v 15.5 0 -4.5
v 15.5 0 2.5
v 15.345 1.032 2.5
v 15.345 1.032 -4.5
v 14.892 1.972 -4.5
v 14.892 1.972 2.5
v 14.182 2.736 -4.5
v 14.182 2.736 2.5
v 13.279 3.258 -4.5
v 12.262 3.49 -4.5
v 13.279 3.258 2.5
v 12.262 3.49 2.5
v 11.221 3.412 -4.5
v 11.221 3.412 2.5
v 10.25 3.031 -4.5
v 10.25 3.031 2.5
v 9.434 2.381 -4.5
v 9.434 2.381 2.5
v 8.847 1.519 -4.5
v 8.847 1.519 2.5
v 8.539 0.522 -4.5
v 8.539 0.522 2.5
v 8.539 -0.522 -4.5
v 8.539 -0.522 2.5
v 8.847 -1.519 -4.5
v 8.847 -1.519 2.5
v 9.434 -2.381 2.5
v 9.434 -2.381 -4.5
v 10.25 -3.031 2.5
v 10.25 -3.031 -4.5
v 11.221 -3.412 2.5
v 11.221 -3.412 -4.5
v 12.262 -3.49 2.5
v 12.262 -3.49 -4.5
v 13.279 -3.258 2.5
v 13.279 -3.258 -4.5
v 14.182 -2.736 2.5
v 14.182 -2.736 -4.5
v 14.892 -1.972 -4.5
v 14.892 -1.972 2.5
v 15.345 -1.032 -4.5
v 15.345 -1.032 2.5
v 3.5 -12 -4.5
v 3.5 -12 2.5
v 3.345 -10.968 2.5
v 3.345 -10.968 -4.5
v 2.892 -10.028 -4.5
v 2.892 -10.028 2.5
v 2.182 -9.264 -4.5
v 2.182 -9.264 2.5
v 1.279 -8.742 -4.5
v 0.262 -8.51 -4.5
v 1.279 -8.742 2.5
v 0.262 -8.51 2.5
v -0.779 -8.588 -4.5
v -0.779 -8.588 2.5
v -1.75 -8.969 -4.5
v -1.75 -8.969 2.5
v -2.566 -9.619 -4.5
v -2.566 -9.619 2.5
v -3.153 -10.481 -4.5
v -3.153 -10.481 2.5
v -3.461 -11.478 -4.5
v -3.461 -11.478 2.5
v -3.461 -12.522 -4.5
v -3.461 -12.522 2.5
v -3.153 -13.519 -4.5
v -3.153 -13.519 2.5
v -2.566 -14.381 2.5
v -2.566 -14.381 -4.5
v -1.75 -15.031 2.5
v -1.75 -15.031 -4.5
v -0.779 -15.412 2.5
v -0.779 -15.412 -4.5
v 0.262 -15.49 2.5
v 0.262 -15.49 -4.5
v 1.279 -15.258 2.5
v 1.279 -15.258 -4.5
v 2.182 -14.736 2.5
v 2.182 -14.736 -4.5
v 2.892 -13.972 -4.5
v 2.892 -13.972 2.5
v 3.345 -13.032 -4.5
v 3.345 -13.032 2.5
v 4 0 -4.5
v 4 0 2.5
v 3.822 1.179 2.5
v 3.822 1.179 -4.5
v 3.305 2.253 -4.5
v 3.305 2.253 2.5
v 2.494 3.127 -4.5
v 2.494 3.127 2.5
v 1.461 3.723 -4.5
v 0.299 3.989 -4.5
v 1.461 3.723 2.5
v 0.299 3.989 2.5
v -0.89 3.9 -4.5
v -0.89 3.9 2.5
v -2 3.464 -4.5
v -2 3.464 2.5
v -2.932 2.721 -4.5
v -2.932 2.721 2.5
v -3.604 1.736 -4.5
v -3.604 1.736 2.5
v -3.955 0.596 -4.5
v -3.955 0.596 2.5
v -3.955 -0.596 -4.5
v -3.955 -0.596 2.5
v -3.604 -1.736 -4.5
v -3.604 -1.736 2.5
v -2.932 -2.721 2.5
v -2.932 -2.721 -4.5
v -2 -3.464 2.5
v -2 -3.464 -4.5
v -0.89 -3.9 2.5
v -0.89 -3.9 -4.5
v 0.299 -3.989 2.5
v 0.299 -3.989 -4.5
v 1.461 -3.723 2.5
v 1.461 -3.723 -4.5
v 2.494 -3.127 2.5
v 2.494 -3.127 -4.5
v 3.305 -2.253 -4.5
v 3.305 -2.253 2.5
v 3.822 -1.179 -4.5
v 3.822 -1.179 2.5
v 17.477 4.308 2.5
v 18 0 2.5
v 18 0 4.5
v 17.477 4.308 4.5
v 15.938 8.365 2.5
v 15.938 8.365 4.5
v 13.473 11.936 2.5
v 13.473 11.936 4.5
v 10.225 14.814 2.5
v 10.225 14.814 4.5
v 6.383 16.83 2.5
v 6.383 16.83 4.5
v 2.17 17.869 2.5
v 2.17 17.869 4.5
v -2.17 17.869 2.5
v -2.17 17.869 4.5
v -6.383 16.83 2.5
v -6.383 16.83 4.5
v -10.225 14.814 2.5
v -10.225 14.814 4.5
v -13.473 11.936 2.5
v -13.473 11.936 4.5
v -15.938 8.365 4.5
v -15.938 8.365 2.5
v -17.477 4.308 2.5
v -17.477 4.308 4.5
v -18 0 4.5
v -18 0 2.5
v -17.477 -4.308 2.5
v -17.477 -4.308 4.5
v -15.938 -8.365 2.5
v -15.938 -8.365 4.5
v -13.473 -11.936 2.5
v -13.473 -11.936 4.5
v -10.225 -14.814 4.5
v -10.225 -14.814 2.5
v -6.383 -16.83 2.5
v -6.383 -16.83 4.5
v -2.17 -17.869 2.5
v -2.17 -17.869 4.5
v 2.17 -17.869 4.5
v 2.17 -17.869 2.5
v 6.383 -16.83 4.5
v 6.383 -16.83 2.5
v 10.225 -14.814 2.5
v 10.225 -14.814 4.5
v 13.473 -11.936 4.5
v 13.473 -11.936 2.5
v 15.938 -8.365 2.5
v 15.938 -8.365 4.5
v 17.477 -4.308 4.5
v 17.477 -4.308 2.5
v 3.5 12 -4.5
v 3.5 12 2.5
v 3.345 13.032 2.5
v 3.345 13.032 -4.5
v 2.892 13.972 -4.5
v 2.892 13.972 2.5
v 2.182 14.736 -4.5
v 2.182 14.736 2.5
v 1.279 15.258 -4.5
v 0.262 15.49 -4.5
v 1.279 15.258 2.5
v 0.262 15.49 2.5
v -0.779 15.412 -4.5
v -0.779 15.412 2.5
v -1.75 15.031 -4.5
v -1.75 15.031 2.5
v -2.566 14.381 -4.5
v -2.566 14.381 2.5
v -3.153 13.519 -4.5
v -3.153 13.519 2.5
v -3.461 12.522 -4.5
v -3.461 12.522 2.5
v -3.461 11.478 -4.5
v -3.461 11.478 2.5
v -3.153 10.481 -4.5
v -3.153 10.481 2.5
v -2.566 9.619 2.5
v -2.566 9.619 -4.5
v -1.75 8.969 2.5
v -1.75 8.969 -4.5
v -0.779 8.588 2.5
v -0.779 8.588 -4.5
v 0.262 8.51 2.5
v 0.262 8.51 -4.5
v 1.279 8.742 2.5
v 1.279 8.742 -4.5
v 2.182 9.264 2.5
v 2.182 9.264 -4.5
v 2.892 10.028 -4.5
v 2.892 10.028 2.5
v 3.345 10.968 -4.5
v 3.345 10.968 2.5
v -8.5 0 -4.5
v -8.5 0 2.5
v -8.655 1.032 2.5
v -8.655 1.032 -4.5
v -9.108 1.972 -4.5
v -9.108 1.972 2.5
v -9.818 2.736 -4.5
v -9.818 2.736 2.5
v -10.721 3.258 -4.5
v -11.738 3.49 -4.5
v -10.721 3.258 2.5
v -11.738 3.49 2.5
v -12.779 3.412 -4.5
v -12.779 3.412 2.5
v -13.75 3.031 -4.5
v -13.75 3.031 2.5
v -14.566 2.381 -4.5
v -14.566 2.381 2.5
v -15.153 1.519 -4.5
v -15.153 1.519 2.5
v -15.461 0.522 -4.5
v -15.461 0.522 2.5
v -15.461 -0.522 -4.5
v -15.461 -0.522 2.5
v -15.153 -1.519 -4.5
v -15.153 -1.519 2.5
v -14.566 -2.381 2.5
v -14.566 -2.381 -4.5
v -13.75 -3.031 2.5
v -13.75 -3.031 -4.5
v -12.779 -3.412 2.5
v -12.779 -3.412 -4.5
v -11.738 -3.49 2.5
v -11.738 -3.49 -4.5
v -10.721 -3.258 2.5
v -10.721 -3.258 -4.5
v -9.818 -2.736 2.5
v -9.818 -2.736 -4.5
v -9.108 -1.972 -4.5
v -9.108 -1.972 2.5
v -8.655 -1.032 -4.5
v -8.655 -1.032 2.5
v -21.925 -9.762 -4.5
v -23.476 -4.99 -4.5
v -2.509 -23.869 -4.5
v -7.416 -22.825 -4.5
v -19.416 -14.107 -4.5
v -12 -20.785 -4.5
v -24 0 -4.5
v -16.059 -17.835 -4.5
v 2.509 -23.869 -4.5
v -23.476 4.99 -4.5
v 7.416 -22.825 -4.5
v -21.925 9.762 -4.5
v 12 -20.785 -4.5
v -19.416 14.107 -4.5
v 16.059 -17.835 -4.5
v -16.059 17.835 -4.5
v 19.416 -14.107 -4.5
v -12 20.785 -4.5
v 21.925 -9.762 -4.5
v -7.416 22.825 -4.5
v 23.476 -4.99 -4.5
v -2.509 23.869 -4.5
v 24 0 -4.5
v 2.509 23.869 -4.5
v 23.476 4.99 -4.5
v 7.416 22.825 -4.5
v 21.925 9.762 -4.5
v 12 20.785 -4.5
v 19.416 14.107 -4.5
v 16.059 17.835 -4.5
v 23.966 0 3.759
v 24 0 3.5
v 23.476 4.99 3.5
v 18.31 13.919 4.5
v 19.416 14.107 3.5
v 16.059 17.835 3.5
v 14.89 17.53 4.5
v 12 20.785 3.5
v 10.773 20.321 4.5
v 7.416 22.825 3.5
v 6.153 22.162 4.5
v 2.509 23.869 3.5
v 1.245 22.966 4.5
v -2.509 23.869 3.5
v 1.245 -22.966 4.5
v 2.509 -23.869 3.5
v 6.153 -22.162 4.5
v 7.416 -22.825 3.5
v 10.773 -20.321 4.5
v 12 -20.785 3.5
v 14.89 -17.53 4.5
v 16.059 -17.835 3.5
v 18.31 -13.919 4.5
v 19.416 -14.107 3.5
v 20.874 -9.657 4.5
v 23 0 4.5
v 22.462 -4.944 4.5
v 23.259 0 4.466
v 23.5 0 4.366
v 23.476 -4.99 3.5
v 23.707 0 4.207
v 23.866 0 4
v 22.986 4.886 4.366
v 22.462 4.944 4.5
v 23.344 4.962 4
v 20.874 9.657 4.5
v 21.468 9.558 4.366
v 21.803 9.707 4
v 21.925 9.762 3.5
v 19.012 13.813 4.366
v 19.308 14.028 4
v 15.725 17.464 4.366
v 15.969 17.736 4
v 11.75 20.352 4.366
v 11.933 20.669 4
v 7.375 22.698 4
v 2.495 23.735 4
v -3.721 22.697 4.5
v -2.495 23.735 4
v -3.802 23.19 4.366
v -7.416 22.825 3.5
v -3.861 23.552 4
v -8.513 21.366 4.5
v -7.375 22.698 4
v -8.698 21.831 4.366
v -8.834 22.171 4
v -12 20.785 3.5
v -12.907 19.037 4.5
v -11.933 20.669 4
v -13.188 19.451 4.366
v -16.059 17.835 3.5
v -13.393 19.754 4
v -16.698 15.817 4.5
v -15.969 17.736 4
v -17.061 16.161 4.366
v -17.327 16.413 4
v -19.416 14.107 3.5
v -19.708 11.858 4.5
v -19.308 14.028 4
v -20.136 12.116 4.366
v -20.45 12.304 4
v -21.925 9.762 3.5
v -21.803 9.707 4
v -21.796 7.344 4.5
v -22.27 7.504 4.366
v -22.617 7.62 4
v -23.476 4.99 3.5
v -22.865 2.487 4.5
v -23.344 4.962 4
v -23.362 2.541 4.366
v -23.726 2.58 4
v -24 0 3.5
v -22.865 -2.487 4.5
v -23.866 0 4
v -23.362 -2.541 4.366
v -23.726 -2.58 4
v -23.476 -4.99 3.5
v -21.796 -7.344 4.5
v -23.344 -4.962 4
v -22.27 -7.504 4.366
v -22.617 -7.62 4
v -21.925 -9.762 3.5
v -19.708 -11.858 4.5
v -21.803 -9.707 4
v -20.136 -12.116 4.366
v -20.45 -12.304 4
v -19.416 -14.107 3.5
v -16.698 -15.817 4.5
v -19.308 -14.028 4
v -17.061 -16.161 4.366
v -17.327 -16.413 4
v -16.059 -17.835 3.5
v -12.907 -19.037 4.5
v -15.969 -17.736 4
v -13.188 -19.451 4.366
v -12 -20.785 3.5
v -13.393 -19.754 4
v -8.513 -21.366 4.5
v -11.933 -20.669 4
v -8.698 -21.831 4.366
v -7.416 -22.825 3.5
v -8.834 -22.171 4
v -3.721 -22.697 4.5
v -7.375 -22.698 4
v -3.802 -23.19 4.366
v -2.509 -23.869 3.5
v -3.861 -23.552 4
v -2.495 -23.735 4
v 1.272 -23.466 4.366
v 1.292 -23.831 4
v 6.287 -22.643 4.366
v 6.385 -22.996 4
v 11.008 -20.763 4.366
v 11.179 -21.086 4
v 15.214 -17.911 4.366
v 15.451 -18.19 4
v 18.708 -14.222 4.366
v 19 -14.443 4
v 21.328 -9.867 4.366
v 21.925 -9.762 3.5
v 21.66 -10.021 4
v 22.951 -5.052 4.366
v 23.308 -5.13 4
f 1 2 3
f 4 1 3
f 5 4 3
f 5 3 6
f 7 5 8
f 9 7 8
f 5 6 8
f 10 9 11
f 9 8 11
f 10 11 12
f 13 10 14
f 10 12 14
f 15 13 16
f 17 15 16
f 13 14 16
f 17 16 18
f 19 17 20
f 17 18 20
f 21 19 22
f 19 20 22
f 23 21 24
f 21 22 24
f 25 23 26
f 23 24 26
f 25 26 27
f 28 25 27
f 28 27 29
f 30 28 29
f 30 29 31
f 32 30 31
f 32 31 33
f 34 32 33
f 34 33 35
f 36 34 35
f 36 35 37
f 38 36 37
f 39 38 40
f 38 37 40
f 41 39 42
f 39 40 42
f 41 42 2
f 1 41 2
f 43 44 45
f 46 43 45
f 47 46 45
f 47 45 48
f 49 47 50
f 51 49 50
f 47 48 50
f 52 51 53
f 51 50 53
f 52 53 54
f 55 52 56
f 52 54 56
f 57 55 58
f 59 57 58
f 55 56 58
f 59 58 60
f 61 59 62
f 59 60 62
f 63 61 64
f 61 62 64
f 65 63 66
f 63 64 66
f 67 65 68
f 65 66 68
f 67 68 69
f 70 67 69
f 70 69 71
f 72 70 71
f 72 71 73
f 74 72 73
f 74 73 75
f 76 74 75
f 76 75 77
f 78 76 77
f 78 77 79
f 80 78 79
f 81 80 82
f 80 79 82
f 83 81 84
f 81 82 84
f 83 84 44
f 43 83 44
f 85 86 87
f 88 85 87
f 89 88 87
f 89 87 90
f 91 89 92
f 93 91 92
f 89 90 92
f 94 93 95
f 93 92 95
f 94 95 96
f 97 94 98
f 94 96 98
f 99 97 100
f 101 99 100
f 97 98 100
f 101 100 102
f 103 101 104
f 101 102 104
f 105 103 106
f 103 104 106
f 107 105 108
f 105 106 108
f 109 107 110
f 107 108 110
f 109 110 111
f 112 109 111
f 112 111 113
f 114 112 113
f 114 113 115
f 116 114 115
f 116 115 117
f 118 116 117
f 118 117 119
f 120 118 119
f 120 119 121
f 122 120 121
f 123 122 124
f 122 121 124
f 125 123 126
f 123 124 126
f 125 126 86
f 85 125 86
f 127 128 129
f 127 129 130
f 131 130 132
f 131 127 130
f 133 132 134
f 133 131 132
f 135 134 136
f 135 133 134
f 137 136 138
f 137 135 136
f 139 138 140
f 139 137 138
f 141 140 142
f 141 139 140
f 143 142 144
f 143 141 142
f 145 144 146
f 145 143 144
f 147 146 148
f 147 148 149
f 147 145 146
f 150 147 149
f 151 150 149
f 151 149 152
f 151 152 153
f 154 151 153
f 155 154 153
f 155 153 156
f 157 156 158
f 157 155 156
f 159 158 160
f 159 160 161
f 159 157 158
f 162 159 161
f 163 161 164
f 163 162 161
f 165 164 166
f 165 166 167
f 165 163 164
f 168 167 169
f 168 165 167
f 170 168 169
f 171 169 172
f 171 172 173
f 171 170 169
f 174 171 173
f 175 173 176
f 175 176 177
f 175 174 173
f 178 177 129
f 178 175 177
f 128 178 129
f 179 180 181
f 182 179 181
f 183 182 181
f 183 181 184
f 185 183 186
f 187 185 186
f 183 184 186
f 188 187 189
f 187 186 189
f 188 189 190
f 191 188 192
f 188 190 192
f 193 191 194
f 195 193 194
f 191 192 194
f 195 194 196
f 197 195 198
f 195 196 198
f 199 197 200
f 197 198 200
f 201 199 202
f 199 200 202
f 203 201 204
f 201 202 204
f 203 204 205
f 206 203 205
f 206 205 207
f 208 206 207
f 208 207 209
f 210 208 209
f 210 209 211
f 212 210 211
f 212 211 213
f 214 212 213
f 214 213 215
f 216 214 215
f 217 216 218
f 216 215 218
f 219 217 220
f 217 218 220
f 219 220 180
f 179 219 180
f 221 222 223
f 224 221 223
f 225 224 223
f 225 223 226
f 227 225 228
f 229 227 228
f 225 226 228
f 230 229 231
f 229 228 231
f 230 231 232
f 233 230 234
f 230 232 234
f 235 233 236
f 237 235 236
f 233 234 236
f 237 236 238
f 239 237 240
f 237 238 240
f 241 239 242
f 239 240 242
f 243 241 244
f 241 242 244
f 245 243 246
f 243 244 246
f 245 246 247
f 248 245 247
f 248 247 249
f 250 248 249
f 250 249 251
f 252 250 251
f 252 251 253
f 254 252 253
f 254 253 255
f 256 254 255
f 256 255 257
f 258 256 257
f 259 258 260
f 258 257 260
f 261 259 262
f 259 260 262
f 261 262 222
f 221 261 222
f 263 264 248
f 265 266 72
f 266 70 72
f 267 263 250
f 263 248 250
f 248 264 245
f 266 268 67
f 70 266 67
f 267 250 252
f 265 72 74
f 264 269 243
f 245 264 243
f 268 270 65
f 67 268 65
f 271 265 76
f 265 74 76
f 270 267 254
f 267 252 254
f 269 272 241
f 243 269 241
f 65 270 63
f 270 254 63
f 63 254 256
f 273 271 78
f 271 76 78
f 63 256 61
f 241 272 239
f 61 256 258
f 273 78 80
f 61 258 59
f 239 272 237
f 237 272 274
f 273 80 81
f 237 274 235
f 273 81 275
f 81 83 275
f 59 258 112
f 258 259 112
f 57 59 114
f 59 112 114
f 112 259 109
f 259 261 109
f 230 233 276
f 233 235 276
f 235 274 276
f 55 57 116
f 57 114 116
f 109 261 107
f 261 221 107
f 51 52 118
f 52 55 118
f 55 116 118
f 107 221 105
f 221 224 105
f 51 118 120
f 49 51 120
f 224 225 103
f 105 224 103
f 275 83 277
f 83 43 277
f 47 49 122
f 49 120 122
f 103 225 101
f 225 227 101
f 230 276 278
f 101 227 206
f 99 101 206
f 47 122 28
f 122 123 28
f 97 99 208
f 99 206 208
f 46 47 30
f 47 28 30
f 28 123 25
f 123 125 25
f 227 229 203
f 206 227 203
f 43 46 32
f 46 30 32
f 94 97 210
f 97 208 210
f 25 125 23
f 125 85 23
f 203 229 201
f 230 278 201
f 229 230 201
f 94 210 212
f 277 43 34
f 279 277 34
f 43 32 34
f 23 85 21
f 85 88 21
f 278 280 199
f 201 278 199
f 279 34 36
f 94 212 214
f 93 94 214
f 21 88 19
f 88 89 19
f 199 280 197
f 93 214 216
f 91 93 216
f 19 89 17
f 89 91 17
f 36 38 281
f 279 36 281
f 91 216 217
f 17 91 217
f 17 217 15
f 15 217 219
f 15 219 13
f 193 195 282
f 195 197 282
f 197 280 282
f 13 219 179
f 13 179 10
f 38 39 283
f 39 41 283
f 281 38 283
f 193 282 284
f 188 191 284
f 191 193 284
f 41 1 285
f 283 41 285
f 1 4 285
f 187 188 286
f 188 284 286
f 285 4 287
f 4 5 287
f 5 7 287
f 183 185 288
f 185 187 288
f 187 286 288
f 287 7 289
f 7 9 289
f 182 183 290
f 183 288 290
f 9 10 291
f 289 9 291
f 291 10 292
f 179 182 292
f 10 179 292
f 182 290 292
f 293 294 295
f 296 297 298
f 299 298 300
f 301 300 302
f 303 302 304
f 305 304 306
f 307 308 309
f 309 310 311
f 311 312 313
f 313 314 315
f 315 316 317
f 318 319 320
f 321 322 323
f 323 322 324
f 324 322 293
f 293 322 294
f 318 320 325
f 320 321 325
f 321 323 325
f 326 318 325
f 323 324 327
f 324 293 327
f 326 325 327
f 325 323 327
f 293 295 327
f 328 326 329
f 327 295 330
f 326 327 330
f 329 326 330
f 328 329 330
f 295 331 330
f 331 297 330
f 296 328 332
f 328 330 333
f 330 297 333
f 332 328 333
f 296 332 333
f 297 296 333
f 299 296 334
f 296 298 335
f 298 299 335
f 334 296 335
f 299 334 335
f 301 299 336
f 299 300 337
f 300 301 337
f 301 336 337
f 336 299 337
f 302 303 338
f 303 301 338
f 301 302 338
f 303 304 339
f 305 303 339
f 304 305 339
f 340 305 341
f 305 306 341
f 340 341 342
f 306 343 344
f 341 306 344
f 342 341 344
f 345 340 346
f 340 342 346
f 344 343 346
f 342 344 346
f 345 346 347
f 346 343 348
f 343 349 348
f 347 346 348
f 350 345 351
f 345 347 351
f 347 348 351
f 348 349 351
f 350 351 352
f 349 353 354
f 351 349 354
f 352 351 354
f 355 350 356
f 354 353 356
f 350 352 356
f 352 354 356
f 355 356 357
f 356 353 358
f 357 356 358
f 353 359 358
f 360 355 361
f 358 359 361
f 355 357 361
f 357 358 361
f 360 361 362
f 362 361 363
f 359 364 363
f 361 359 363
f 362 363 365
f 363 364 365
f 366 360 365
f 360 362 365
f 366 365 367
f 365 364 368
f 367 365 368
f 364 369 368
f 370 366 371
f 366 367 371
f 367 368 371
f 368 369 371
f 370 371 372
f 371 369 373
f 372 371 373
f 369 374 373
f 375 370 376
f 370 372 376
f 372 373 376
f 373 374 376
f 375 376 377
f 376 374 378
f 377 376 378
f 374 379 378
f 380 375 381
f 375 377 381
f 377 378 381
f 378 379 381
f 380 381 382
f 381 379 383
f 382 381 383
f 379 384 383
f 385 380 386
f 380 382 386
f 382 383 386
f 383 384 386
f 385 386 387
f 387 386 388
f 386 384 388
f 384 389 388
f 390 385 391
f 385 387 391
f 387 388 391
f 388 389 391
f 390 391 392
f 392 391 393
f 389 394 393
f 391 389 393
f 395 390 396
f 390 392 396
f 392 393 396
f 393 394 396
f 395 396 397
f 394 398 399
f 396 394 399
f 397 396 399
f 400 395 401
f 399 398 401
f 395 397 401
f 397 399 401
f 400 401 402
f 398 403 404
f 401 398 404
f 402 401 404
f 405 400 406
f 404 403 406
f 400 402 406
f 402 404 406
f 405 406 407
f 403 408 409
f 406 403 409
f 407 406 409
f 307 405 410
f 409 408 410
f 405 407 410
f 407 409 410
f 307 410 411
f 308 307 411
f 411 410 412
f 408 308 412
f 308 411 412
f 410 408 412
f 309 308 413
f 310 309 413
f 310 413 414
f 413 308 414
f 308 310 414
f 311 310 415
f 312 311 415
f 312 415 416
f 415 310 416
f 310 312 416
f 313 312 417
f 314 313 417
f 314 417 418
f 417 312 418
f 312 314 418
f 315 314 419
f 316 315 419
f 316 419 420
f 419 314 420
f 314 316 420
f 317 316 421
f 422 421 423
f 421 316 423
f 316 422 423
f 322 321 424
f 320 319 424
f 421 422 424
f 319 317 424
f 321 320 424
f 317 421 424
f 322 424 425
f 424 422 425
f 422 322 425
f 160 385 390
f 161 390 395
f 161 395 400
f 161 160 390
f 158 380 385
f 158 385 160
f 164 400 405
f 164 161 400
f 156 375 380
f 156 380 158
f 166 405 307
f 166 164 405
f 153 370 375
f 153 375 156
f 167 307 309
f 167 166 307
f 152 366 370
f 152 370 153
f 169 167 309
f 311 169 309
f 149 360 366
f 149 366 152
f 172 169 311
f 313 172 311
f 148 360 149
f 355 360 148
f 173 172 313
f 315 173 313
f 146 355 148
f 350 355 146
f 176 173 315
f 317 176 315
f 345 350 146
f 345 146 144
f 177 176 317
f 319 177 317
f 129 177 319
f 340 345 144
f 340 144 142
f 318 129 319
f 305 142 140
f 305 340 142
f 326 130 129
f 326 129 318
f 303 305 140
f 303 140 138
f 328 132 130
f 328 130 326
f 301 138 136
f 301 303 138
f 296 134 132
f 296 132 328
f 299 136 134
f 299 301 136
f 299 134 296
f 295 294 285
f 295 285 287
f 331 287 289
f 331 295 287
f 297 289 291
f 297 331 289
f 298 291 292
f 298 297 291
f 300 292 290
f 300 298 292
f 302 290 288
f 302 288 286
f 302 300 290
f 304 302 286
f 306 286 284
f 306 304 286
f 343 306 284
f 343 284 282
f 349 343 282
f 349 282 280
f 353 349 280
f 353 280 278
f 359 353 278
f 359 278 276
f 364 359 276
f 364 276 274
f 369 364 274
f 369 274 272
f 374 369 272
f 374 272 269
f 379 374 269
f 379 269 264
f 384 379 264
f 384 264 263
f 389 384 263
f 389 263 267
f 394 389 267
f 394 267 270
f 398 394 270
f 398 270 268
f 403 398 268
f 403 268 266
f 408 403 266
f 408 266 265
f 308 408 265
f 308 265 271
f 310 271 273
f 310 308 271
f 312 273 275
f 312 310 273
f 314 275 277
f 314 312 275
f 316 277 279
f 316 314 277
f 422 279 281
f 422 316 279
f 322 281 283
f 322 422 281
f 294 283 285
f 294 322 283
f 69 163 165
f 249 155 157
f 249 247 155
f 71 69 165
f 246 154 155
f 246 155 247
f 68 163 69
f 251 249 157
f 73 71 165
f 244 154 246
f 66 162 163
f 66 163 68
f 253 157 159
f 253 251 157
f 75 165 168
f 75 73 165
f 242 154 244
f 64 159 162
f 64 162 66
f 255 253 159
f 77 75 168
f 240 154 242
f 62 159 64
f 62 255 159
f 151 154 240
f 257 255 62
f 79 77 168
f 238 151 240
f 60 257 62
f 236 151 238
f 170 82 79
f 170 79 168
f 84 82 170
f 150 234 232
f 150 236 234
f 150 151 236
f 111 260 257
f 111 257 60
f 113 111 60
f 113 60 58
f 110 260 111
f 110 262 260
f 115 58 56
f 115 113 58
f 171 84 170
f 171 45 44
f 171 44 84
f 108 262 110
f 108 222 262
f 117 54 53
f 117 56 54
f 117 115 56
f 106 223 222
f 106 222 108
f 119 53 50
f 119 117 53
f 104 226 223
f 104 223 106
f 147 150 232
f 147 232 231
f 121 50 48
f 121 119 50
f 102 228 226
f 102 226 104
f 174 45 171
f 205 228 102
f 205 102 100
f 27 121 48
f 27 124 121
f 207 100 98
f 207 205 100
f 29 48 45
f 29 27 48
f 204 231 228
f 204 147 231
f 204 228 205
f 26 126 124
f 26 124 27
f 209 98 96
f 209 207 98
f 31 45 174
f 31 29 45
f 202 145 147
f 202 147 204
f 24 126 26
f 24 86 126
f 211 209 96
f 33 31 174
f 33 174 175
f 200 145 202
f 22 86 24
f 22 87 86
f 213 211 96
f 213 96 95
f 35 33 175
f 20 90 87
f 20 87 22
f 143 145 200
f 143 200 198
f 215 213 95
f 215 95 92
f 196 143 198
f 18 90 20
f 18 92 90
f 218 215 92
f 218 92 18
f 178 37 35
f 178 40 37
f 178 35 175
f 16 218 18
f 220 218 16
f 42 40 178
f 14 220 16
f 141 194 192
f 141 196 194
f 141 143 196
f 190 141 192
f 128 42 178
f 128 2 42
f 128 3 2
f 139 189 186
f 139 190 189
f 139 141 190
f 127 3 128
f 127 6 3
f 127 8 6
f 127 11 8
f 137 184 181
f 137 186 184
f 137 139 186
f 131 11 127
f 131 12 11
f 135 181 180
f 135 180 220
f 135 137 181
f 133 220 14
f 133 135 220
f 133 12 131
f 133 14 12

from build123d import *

# Parameters (mm, degrees)
SKETCH1_R           = 24
SKETCH1_R_2         = 18
BOSS_EXTRUDE3_DEPTH = 4.5
BOSS_EXTRUDE4_START = -4.5
SKETCH1_7_R         = 18
SKETCH1_7_R_2       = 3.5
SKETCH1_7_R_3       = 4
BOSS_EXTRUDE4_DEPTH = 7
FILLET1_R           = 1


with BuildPart() as part:
    # Sketch1 → Boss-Extrude3 (new, symmetric)
    with BuildSketch(Plane.XY):
        Circle(SKETCH1_R)
        Circle(SKETCH1_R_2, mode=Mode.SUBTRACT)
    extrude(amount=BOSS_EXTRUDE3_DEPTH, both=True)

    # Sketch1<7> → Boss-Extrude4 (add)
    with BuildSketch(Plane.XY.offset(BOSS_EXTRUDE4_START)):
        Circle(SKETCH1_7_R)
        with Locations((0, -12)):
            Circle(SKETCH1_7_R_2, mode=Mode.SUBTRACT)
        with Locations((-12, 0)):
            Circle(SKETCH1_7_R_2, mode=Mode.SUBTRACT)
        Circle(SKETCH1_7_R_3, mode=Mode.SUBTRACT)
        with Locations((12, 0)):
            Circle(SKETCH1_7_R_2, mode=Mode.SUBTRACT)
        with Locations((0, 12)):
            Circle(SKETCH1_7_R_2, mode=Mode.SUBTRACT)
    extrude(amount=BOSS_EXTRUDE4_DEPTH)

    # Fillet1
    fillet1_edges = [part.edges().sort_by_distance(p)[0] for p in [
        (-24, 0, 4.5),
    ]]
    fillet(fillet1_edges, radius=FILLET1_R)


solid = part.part
